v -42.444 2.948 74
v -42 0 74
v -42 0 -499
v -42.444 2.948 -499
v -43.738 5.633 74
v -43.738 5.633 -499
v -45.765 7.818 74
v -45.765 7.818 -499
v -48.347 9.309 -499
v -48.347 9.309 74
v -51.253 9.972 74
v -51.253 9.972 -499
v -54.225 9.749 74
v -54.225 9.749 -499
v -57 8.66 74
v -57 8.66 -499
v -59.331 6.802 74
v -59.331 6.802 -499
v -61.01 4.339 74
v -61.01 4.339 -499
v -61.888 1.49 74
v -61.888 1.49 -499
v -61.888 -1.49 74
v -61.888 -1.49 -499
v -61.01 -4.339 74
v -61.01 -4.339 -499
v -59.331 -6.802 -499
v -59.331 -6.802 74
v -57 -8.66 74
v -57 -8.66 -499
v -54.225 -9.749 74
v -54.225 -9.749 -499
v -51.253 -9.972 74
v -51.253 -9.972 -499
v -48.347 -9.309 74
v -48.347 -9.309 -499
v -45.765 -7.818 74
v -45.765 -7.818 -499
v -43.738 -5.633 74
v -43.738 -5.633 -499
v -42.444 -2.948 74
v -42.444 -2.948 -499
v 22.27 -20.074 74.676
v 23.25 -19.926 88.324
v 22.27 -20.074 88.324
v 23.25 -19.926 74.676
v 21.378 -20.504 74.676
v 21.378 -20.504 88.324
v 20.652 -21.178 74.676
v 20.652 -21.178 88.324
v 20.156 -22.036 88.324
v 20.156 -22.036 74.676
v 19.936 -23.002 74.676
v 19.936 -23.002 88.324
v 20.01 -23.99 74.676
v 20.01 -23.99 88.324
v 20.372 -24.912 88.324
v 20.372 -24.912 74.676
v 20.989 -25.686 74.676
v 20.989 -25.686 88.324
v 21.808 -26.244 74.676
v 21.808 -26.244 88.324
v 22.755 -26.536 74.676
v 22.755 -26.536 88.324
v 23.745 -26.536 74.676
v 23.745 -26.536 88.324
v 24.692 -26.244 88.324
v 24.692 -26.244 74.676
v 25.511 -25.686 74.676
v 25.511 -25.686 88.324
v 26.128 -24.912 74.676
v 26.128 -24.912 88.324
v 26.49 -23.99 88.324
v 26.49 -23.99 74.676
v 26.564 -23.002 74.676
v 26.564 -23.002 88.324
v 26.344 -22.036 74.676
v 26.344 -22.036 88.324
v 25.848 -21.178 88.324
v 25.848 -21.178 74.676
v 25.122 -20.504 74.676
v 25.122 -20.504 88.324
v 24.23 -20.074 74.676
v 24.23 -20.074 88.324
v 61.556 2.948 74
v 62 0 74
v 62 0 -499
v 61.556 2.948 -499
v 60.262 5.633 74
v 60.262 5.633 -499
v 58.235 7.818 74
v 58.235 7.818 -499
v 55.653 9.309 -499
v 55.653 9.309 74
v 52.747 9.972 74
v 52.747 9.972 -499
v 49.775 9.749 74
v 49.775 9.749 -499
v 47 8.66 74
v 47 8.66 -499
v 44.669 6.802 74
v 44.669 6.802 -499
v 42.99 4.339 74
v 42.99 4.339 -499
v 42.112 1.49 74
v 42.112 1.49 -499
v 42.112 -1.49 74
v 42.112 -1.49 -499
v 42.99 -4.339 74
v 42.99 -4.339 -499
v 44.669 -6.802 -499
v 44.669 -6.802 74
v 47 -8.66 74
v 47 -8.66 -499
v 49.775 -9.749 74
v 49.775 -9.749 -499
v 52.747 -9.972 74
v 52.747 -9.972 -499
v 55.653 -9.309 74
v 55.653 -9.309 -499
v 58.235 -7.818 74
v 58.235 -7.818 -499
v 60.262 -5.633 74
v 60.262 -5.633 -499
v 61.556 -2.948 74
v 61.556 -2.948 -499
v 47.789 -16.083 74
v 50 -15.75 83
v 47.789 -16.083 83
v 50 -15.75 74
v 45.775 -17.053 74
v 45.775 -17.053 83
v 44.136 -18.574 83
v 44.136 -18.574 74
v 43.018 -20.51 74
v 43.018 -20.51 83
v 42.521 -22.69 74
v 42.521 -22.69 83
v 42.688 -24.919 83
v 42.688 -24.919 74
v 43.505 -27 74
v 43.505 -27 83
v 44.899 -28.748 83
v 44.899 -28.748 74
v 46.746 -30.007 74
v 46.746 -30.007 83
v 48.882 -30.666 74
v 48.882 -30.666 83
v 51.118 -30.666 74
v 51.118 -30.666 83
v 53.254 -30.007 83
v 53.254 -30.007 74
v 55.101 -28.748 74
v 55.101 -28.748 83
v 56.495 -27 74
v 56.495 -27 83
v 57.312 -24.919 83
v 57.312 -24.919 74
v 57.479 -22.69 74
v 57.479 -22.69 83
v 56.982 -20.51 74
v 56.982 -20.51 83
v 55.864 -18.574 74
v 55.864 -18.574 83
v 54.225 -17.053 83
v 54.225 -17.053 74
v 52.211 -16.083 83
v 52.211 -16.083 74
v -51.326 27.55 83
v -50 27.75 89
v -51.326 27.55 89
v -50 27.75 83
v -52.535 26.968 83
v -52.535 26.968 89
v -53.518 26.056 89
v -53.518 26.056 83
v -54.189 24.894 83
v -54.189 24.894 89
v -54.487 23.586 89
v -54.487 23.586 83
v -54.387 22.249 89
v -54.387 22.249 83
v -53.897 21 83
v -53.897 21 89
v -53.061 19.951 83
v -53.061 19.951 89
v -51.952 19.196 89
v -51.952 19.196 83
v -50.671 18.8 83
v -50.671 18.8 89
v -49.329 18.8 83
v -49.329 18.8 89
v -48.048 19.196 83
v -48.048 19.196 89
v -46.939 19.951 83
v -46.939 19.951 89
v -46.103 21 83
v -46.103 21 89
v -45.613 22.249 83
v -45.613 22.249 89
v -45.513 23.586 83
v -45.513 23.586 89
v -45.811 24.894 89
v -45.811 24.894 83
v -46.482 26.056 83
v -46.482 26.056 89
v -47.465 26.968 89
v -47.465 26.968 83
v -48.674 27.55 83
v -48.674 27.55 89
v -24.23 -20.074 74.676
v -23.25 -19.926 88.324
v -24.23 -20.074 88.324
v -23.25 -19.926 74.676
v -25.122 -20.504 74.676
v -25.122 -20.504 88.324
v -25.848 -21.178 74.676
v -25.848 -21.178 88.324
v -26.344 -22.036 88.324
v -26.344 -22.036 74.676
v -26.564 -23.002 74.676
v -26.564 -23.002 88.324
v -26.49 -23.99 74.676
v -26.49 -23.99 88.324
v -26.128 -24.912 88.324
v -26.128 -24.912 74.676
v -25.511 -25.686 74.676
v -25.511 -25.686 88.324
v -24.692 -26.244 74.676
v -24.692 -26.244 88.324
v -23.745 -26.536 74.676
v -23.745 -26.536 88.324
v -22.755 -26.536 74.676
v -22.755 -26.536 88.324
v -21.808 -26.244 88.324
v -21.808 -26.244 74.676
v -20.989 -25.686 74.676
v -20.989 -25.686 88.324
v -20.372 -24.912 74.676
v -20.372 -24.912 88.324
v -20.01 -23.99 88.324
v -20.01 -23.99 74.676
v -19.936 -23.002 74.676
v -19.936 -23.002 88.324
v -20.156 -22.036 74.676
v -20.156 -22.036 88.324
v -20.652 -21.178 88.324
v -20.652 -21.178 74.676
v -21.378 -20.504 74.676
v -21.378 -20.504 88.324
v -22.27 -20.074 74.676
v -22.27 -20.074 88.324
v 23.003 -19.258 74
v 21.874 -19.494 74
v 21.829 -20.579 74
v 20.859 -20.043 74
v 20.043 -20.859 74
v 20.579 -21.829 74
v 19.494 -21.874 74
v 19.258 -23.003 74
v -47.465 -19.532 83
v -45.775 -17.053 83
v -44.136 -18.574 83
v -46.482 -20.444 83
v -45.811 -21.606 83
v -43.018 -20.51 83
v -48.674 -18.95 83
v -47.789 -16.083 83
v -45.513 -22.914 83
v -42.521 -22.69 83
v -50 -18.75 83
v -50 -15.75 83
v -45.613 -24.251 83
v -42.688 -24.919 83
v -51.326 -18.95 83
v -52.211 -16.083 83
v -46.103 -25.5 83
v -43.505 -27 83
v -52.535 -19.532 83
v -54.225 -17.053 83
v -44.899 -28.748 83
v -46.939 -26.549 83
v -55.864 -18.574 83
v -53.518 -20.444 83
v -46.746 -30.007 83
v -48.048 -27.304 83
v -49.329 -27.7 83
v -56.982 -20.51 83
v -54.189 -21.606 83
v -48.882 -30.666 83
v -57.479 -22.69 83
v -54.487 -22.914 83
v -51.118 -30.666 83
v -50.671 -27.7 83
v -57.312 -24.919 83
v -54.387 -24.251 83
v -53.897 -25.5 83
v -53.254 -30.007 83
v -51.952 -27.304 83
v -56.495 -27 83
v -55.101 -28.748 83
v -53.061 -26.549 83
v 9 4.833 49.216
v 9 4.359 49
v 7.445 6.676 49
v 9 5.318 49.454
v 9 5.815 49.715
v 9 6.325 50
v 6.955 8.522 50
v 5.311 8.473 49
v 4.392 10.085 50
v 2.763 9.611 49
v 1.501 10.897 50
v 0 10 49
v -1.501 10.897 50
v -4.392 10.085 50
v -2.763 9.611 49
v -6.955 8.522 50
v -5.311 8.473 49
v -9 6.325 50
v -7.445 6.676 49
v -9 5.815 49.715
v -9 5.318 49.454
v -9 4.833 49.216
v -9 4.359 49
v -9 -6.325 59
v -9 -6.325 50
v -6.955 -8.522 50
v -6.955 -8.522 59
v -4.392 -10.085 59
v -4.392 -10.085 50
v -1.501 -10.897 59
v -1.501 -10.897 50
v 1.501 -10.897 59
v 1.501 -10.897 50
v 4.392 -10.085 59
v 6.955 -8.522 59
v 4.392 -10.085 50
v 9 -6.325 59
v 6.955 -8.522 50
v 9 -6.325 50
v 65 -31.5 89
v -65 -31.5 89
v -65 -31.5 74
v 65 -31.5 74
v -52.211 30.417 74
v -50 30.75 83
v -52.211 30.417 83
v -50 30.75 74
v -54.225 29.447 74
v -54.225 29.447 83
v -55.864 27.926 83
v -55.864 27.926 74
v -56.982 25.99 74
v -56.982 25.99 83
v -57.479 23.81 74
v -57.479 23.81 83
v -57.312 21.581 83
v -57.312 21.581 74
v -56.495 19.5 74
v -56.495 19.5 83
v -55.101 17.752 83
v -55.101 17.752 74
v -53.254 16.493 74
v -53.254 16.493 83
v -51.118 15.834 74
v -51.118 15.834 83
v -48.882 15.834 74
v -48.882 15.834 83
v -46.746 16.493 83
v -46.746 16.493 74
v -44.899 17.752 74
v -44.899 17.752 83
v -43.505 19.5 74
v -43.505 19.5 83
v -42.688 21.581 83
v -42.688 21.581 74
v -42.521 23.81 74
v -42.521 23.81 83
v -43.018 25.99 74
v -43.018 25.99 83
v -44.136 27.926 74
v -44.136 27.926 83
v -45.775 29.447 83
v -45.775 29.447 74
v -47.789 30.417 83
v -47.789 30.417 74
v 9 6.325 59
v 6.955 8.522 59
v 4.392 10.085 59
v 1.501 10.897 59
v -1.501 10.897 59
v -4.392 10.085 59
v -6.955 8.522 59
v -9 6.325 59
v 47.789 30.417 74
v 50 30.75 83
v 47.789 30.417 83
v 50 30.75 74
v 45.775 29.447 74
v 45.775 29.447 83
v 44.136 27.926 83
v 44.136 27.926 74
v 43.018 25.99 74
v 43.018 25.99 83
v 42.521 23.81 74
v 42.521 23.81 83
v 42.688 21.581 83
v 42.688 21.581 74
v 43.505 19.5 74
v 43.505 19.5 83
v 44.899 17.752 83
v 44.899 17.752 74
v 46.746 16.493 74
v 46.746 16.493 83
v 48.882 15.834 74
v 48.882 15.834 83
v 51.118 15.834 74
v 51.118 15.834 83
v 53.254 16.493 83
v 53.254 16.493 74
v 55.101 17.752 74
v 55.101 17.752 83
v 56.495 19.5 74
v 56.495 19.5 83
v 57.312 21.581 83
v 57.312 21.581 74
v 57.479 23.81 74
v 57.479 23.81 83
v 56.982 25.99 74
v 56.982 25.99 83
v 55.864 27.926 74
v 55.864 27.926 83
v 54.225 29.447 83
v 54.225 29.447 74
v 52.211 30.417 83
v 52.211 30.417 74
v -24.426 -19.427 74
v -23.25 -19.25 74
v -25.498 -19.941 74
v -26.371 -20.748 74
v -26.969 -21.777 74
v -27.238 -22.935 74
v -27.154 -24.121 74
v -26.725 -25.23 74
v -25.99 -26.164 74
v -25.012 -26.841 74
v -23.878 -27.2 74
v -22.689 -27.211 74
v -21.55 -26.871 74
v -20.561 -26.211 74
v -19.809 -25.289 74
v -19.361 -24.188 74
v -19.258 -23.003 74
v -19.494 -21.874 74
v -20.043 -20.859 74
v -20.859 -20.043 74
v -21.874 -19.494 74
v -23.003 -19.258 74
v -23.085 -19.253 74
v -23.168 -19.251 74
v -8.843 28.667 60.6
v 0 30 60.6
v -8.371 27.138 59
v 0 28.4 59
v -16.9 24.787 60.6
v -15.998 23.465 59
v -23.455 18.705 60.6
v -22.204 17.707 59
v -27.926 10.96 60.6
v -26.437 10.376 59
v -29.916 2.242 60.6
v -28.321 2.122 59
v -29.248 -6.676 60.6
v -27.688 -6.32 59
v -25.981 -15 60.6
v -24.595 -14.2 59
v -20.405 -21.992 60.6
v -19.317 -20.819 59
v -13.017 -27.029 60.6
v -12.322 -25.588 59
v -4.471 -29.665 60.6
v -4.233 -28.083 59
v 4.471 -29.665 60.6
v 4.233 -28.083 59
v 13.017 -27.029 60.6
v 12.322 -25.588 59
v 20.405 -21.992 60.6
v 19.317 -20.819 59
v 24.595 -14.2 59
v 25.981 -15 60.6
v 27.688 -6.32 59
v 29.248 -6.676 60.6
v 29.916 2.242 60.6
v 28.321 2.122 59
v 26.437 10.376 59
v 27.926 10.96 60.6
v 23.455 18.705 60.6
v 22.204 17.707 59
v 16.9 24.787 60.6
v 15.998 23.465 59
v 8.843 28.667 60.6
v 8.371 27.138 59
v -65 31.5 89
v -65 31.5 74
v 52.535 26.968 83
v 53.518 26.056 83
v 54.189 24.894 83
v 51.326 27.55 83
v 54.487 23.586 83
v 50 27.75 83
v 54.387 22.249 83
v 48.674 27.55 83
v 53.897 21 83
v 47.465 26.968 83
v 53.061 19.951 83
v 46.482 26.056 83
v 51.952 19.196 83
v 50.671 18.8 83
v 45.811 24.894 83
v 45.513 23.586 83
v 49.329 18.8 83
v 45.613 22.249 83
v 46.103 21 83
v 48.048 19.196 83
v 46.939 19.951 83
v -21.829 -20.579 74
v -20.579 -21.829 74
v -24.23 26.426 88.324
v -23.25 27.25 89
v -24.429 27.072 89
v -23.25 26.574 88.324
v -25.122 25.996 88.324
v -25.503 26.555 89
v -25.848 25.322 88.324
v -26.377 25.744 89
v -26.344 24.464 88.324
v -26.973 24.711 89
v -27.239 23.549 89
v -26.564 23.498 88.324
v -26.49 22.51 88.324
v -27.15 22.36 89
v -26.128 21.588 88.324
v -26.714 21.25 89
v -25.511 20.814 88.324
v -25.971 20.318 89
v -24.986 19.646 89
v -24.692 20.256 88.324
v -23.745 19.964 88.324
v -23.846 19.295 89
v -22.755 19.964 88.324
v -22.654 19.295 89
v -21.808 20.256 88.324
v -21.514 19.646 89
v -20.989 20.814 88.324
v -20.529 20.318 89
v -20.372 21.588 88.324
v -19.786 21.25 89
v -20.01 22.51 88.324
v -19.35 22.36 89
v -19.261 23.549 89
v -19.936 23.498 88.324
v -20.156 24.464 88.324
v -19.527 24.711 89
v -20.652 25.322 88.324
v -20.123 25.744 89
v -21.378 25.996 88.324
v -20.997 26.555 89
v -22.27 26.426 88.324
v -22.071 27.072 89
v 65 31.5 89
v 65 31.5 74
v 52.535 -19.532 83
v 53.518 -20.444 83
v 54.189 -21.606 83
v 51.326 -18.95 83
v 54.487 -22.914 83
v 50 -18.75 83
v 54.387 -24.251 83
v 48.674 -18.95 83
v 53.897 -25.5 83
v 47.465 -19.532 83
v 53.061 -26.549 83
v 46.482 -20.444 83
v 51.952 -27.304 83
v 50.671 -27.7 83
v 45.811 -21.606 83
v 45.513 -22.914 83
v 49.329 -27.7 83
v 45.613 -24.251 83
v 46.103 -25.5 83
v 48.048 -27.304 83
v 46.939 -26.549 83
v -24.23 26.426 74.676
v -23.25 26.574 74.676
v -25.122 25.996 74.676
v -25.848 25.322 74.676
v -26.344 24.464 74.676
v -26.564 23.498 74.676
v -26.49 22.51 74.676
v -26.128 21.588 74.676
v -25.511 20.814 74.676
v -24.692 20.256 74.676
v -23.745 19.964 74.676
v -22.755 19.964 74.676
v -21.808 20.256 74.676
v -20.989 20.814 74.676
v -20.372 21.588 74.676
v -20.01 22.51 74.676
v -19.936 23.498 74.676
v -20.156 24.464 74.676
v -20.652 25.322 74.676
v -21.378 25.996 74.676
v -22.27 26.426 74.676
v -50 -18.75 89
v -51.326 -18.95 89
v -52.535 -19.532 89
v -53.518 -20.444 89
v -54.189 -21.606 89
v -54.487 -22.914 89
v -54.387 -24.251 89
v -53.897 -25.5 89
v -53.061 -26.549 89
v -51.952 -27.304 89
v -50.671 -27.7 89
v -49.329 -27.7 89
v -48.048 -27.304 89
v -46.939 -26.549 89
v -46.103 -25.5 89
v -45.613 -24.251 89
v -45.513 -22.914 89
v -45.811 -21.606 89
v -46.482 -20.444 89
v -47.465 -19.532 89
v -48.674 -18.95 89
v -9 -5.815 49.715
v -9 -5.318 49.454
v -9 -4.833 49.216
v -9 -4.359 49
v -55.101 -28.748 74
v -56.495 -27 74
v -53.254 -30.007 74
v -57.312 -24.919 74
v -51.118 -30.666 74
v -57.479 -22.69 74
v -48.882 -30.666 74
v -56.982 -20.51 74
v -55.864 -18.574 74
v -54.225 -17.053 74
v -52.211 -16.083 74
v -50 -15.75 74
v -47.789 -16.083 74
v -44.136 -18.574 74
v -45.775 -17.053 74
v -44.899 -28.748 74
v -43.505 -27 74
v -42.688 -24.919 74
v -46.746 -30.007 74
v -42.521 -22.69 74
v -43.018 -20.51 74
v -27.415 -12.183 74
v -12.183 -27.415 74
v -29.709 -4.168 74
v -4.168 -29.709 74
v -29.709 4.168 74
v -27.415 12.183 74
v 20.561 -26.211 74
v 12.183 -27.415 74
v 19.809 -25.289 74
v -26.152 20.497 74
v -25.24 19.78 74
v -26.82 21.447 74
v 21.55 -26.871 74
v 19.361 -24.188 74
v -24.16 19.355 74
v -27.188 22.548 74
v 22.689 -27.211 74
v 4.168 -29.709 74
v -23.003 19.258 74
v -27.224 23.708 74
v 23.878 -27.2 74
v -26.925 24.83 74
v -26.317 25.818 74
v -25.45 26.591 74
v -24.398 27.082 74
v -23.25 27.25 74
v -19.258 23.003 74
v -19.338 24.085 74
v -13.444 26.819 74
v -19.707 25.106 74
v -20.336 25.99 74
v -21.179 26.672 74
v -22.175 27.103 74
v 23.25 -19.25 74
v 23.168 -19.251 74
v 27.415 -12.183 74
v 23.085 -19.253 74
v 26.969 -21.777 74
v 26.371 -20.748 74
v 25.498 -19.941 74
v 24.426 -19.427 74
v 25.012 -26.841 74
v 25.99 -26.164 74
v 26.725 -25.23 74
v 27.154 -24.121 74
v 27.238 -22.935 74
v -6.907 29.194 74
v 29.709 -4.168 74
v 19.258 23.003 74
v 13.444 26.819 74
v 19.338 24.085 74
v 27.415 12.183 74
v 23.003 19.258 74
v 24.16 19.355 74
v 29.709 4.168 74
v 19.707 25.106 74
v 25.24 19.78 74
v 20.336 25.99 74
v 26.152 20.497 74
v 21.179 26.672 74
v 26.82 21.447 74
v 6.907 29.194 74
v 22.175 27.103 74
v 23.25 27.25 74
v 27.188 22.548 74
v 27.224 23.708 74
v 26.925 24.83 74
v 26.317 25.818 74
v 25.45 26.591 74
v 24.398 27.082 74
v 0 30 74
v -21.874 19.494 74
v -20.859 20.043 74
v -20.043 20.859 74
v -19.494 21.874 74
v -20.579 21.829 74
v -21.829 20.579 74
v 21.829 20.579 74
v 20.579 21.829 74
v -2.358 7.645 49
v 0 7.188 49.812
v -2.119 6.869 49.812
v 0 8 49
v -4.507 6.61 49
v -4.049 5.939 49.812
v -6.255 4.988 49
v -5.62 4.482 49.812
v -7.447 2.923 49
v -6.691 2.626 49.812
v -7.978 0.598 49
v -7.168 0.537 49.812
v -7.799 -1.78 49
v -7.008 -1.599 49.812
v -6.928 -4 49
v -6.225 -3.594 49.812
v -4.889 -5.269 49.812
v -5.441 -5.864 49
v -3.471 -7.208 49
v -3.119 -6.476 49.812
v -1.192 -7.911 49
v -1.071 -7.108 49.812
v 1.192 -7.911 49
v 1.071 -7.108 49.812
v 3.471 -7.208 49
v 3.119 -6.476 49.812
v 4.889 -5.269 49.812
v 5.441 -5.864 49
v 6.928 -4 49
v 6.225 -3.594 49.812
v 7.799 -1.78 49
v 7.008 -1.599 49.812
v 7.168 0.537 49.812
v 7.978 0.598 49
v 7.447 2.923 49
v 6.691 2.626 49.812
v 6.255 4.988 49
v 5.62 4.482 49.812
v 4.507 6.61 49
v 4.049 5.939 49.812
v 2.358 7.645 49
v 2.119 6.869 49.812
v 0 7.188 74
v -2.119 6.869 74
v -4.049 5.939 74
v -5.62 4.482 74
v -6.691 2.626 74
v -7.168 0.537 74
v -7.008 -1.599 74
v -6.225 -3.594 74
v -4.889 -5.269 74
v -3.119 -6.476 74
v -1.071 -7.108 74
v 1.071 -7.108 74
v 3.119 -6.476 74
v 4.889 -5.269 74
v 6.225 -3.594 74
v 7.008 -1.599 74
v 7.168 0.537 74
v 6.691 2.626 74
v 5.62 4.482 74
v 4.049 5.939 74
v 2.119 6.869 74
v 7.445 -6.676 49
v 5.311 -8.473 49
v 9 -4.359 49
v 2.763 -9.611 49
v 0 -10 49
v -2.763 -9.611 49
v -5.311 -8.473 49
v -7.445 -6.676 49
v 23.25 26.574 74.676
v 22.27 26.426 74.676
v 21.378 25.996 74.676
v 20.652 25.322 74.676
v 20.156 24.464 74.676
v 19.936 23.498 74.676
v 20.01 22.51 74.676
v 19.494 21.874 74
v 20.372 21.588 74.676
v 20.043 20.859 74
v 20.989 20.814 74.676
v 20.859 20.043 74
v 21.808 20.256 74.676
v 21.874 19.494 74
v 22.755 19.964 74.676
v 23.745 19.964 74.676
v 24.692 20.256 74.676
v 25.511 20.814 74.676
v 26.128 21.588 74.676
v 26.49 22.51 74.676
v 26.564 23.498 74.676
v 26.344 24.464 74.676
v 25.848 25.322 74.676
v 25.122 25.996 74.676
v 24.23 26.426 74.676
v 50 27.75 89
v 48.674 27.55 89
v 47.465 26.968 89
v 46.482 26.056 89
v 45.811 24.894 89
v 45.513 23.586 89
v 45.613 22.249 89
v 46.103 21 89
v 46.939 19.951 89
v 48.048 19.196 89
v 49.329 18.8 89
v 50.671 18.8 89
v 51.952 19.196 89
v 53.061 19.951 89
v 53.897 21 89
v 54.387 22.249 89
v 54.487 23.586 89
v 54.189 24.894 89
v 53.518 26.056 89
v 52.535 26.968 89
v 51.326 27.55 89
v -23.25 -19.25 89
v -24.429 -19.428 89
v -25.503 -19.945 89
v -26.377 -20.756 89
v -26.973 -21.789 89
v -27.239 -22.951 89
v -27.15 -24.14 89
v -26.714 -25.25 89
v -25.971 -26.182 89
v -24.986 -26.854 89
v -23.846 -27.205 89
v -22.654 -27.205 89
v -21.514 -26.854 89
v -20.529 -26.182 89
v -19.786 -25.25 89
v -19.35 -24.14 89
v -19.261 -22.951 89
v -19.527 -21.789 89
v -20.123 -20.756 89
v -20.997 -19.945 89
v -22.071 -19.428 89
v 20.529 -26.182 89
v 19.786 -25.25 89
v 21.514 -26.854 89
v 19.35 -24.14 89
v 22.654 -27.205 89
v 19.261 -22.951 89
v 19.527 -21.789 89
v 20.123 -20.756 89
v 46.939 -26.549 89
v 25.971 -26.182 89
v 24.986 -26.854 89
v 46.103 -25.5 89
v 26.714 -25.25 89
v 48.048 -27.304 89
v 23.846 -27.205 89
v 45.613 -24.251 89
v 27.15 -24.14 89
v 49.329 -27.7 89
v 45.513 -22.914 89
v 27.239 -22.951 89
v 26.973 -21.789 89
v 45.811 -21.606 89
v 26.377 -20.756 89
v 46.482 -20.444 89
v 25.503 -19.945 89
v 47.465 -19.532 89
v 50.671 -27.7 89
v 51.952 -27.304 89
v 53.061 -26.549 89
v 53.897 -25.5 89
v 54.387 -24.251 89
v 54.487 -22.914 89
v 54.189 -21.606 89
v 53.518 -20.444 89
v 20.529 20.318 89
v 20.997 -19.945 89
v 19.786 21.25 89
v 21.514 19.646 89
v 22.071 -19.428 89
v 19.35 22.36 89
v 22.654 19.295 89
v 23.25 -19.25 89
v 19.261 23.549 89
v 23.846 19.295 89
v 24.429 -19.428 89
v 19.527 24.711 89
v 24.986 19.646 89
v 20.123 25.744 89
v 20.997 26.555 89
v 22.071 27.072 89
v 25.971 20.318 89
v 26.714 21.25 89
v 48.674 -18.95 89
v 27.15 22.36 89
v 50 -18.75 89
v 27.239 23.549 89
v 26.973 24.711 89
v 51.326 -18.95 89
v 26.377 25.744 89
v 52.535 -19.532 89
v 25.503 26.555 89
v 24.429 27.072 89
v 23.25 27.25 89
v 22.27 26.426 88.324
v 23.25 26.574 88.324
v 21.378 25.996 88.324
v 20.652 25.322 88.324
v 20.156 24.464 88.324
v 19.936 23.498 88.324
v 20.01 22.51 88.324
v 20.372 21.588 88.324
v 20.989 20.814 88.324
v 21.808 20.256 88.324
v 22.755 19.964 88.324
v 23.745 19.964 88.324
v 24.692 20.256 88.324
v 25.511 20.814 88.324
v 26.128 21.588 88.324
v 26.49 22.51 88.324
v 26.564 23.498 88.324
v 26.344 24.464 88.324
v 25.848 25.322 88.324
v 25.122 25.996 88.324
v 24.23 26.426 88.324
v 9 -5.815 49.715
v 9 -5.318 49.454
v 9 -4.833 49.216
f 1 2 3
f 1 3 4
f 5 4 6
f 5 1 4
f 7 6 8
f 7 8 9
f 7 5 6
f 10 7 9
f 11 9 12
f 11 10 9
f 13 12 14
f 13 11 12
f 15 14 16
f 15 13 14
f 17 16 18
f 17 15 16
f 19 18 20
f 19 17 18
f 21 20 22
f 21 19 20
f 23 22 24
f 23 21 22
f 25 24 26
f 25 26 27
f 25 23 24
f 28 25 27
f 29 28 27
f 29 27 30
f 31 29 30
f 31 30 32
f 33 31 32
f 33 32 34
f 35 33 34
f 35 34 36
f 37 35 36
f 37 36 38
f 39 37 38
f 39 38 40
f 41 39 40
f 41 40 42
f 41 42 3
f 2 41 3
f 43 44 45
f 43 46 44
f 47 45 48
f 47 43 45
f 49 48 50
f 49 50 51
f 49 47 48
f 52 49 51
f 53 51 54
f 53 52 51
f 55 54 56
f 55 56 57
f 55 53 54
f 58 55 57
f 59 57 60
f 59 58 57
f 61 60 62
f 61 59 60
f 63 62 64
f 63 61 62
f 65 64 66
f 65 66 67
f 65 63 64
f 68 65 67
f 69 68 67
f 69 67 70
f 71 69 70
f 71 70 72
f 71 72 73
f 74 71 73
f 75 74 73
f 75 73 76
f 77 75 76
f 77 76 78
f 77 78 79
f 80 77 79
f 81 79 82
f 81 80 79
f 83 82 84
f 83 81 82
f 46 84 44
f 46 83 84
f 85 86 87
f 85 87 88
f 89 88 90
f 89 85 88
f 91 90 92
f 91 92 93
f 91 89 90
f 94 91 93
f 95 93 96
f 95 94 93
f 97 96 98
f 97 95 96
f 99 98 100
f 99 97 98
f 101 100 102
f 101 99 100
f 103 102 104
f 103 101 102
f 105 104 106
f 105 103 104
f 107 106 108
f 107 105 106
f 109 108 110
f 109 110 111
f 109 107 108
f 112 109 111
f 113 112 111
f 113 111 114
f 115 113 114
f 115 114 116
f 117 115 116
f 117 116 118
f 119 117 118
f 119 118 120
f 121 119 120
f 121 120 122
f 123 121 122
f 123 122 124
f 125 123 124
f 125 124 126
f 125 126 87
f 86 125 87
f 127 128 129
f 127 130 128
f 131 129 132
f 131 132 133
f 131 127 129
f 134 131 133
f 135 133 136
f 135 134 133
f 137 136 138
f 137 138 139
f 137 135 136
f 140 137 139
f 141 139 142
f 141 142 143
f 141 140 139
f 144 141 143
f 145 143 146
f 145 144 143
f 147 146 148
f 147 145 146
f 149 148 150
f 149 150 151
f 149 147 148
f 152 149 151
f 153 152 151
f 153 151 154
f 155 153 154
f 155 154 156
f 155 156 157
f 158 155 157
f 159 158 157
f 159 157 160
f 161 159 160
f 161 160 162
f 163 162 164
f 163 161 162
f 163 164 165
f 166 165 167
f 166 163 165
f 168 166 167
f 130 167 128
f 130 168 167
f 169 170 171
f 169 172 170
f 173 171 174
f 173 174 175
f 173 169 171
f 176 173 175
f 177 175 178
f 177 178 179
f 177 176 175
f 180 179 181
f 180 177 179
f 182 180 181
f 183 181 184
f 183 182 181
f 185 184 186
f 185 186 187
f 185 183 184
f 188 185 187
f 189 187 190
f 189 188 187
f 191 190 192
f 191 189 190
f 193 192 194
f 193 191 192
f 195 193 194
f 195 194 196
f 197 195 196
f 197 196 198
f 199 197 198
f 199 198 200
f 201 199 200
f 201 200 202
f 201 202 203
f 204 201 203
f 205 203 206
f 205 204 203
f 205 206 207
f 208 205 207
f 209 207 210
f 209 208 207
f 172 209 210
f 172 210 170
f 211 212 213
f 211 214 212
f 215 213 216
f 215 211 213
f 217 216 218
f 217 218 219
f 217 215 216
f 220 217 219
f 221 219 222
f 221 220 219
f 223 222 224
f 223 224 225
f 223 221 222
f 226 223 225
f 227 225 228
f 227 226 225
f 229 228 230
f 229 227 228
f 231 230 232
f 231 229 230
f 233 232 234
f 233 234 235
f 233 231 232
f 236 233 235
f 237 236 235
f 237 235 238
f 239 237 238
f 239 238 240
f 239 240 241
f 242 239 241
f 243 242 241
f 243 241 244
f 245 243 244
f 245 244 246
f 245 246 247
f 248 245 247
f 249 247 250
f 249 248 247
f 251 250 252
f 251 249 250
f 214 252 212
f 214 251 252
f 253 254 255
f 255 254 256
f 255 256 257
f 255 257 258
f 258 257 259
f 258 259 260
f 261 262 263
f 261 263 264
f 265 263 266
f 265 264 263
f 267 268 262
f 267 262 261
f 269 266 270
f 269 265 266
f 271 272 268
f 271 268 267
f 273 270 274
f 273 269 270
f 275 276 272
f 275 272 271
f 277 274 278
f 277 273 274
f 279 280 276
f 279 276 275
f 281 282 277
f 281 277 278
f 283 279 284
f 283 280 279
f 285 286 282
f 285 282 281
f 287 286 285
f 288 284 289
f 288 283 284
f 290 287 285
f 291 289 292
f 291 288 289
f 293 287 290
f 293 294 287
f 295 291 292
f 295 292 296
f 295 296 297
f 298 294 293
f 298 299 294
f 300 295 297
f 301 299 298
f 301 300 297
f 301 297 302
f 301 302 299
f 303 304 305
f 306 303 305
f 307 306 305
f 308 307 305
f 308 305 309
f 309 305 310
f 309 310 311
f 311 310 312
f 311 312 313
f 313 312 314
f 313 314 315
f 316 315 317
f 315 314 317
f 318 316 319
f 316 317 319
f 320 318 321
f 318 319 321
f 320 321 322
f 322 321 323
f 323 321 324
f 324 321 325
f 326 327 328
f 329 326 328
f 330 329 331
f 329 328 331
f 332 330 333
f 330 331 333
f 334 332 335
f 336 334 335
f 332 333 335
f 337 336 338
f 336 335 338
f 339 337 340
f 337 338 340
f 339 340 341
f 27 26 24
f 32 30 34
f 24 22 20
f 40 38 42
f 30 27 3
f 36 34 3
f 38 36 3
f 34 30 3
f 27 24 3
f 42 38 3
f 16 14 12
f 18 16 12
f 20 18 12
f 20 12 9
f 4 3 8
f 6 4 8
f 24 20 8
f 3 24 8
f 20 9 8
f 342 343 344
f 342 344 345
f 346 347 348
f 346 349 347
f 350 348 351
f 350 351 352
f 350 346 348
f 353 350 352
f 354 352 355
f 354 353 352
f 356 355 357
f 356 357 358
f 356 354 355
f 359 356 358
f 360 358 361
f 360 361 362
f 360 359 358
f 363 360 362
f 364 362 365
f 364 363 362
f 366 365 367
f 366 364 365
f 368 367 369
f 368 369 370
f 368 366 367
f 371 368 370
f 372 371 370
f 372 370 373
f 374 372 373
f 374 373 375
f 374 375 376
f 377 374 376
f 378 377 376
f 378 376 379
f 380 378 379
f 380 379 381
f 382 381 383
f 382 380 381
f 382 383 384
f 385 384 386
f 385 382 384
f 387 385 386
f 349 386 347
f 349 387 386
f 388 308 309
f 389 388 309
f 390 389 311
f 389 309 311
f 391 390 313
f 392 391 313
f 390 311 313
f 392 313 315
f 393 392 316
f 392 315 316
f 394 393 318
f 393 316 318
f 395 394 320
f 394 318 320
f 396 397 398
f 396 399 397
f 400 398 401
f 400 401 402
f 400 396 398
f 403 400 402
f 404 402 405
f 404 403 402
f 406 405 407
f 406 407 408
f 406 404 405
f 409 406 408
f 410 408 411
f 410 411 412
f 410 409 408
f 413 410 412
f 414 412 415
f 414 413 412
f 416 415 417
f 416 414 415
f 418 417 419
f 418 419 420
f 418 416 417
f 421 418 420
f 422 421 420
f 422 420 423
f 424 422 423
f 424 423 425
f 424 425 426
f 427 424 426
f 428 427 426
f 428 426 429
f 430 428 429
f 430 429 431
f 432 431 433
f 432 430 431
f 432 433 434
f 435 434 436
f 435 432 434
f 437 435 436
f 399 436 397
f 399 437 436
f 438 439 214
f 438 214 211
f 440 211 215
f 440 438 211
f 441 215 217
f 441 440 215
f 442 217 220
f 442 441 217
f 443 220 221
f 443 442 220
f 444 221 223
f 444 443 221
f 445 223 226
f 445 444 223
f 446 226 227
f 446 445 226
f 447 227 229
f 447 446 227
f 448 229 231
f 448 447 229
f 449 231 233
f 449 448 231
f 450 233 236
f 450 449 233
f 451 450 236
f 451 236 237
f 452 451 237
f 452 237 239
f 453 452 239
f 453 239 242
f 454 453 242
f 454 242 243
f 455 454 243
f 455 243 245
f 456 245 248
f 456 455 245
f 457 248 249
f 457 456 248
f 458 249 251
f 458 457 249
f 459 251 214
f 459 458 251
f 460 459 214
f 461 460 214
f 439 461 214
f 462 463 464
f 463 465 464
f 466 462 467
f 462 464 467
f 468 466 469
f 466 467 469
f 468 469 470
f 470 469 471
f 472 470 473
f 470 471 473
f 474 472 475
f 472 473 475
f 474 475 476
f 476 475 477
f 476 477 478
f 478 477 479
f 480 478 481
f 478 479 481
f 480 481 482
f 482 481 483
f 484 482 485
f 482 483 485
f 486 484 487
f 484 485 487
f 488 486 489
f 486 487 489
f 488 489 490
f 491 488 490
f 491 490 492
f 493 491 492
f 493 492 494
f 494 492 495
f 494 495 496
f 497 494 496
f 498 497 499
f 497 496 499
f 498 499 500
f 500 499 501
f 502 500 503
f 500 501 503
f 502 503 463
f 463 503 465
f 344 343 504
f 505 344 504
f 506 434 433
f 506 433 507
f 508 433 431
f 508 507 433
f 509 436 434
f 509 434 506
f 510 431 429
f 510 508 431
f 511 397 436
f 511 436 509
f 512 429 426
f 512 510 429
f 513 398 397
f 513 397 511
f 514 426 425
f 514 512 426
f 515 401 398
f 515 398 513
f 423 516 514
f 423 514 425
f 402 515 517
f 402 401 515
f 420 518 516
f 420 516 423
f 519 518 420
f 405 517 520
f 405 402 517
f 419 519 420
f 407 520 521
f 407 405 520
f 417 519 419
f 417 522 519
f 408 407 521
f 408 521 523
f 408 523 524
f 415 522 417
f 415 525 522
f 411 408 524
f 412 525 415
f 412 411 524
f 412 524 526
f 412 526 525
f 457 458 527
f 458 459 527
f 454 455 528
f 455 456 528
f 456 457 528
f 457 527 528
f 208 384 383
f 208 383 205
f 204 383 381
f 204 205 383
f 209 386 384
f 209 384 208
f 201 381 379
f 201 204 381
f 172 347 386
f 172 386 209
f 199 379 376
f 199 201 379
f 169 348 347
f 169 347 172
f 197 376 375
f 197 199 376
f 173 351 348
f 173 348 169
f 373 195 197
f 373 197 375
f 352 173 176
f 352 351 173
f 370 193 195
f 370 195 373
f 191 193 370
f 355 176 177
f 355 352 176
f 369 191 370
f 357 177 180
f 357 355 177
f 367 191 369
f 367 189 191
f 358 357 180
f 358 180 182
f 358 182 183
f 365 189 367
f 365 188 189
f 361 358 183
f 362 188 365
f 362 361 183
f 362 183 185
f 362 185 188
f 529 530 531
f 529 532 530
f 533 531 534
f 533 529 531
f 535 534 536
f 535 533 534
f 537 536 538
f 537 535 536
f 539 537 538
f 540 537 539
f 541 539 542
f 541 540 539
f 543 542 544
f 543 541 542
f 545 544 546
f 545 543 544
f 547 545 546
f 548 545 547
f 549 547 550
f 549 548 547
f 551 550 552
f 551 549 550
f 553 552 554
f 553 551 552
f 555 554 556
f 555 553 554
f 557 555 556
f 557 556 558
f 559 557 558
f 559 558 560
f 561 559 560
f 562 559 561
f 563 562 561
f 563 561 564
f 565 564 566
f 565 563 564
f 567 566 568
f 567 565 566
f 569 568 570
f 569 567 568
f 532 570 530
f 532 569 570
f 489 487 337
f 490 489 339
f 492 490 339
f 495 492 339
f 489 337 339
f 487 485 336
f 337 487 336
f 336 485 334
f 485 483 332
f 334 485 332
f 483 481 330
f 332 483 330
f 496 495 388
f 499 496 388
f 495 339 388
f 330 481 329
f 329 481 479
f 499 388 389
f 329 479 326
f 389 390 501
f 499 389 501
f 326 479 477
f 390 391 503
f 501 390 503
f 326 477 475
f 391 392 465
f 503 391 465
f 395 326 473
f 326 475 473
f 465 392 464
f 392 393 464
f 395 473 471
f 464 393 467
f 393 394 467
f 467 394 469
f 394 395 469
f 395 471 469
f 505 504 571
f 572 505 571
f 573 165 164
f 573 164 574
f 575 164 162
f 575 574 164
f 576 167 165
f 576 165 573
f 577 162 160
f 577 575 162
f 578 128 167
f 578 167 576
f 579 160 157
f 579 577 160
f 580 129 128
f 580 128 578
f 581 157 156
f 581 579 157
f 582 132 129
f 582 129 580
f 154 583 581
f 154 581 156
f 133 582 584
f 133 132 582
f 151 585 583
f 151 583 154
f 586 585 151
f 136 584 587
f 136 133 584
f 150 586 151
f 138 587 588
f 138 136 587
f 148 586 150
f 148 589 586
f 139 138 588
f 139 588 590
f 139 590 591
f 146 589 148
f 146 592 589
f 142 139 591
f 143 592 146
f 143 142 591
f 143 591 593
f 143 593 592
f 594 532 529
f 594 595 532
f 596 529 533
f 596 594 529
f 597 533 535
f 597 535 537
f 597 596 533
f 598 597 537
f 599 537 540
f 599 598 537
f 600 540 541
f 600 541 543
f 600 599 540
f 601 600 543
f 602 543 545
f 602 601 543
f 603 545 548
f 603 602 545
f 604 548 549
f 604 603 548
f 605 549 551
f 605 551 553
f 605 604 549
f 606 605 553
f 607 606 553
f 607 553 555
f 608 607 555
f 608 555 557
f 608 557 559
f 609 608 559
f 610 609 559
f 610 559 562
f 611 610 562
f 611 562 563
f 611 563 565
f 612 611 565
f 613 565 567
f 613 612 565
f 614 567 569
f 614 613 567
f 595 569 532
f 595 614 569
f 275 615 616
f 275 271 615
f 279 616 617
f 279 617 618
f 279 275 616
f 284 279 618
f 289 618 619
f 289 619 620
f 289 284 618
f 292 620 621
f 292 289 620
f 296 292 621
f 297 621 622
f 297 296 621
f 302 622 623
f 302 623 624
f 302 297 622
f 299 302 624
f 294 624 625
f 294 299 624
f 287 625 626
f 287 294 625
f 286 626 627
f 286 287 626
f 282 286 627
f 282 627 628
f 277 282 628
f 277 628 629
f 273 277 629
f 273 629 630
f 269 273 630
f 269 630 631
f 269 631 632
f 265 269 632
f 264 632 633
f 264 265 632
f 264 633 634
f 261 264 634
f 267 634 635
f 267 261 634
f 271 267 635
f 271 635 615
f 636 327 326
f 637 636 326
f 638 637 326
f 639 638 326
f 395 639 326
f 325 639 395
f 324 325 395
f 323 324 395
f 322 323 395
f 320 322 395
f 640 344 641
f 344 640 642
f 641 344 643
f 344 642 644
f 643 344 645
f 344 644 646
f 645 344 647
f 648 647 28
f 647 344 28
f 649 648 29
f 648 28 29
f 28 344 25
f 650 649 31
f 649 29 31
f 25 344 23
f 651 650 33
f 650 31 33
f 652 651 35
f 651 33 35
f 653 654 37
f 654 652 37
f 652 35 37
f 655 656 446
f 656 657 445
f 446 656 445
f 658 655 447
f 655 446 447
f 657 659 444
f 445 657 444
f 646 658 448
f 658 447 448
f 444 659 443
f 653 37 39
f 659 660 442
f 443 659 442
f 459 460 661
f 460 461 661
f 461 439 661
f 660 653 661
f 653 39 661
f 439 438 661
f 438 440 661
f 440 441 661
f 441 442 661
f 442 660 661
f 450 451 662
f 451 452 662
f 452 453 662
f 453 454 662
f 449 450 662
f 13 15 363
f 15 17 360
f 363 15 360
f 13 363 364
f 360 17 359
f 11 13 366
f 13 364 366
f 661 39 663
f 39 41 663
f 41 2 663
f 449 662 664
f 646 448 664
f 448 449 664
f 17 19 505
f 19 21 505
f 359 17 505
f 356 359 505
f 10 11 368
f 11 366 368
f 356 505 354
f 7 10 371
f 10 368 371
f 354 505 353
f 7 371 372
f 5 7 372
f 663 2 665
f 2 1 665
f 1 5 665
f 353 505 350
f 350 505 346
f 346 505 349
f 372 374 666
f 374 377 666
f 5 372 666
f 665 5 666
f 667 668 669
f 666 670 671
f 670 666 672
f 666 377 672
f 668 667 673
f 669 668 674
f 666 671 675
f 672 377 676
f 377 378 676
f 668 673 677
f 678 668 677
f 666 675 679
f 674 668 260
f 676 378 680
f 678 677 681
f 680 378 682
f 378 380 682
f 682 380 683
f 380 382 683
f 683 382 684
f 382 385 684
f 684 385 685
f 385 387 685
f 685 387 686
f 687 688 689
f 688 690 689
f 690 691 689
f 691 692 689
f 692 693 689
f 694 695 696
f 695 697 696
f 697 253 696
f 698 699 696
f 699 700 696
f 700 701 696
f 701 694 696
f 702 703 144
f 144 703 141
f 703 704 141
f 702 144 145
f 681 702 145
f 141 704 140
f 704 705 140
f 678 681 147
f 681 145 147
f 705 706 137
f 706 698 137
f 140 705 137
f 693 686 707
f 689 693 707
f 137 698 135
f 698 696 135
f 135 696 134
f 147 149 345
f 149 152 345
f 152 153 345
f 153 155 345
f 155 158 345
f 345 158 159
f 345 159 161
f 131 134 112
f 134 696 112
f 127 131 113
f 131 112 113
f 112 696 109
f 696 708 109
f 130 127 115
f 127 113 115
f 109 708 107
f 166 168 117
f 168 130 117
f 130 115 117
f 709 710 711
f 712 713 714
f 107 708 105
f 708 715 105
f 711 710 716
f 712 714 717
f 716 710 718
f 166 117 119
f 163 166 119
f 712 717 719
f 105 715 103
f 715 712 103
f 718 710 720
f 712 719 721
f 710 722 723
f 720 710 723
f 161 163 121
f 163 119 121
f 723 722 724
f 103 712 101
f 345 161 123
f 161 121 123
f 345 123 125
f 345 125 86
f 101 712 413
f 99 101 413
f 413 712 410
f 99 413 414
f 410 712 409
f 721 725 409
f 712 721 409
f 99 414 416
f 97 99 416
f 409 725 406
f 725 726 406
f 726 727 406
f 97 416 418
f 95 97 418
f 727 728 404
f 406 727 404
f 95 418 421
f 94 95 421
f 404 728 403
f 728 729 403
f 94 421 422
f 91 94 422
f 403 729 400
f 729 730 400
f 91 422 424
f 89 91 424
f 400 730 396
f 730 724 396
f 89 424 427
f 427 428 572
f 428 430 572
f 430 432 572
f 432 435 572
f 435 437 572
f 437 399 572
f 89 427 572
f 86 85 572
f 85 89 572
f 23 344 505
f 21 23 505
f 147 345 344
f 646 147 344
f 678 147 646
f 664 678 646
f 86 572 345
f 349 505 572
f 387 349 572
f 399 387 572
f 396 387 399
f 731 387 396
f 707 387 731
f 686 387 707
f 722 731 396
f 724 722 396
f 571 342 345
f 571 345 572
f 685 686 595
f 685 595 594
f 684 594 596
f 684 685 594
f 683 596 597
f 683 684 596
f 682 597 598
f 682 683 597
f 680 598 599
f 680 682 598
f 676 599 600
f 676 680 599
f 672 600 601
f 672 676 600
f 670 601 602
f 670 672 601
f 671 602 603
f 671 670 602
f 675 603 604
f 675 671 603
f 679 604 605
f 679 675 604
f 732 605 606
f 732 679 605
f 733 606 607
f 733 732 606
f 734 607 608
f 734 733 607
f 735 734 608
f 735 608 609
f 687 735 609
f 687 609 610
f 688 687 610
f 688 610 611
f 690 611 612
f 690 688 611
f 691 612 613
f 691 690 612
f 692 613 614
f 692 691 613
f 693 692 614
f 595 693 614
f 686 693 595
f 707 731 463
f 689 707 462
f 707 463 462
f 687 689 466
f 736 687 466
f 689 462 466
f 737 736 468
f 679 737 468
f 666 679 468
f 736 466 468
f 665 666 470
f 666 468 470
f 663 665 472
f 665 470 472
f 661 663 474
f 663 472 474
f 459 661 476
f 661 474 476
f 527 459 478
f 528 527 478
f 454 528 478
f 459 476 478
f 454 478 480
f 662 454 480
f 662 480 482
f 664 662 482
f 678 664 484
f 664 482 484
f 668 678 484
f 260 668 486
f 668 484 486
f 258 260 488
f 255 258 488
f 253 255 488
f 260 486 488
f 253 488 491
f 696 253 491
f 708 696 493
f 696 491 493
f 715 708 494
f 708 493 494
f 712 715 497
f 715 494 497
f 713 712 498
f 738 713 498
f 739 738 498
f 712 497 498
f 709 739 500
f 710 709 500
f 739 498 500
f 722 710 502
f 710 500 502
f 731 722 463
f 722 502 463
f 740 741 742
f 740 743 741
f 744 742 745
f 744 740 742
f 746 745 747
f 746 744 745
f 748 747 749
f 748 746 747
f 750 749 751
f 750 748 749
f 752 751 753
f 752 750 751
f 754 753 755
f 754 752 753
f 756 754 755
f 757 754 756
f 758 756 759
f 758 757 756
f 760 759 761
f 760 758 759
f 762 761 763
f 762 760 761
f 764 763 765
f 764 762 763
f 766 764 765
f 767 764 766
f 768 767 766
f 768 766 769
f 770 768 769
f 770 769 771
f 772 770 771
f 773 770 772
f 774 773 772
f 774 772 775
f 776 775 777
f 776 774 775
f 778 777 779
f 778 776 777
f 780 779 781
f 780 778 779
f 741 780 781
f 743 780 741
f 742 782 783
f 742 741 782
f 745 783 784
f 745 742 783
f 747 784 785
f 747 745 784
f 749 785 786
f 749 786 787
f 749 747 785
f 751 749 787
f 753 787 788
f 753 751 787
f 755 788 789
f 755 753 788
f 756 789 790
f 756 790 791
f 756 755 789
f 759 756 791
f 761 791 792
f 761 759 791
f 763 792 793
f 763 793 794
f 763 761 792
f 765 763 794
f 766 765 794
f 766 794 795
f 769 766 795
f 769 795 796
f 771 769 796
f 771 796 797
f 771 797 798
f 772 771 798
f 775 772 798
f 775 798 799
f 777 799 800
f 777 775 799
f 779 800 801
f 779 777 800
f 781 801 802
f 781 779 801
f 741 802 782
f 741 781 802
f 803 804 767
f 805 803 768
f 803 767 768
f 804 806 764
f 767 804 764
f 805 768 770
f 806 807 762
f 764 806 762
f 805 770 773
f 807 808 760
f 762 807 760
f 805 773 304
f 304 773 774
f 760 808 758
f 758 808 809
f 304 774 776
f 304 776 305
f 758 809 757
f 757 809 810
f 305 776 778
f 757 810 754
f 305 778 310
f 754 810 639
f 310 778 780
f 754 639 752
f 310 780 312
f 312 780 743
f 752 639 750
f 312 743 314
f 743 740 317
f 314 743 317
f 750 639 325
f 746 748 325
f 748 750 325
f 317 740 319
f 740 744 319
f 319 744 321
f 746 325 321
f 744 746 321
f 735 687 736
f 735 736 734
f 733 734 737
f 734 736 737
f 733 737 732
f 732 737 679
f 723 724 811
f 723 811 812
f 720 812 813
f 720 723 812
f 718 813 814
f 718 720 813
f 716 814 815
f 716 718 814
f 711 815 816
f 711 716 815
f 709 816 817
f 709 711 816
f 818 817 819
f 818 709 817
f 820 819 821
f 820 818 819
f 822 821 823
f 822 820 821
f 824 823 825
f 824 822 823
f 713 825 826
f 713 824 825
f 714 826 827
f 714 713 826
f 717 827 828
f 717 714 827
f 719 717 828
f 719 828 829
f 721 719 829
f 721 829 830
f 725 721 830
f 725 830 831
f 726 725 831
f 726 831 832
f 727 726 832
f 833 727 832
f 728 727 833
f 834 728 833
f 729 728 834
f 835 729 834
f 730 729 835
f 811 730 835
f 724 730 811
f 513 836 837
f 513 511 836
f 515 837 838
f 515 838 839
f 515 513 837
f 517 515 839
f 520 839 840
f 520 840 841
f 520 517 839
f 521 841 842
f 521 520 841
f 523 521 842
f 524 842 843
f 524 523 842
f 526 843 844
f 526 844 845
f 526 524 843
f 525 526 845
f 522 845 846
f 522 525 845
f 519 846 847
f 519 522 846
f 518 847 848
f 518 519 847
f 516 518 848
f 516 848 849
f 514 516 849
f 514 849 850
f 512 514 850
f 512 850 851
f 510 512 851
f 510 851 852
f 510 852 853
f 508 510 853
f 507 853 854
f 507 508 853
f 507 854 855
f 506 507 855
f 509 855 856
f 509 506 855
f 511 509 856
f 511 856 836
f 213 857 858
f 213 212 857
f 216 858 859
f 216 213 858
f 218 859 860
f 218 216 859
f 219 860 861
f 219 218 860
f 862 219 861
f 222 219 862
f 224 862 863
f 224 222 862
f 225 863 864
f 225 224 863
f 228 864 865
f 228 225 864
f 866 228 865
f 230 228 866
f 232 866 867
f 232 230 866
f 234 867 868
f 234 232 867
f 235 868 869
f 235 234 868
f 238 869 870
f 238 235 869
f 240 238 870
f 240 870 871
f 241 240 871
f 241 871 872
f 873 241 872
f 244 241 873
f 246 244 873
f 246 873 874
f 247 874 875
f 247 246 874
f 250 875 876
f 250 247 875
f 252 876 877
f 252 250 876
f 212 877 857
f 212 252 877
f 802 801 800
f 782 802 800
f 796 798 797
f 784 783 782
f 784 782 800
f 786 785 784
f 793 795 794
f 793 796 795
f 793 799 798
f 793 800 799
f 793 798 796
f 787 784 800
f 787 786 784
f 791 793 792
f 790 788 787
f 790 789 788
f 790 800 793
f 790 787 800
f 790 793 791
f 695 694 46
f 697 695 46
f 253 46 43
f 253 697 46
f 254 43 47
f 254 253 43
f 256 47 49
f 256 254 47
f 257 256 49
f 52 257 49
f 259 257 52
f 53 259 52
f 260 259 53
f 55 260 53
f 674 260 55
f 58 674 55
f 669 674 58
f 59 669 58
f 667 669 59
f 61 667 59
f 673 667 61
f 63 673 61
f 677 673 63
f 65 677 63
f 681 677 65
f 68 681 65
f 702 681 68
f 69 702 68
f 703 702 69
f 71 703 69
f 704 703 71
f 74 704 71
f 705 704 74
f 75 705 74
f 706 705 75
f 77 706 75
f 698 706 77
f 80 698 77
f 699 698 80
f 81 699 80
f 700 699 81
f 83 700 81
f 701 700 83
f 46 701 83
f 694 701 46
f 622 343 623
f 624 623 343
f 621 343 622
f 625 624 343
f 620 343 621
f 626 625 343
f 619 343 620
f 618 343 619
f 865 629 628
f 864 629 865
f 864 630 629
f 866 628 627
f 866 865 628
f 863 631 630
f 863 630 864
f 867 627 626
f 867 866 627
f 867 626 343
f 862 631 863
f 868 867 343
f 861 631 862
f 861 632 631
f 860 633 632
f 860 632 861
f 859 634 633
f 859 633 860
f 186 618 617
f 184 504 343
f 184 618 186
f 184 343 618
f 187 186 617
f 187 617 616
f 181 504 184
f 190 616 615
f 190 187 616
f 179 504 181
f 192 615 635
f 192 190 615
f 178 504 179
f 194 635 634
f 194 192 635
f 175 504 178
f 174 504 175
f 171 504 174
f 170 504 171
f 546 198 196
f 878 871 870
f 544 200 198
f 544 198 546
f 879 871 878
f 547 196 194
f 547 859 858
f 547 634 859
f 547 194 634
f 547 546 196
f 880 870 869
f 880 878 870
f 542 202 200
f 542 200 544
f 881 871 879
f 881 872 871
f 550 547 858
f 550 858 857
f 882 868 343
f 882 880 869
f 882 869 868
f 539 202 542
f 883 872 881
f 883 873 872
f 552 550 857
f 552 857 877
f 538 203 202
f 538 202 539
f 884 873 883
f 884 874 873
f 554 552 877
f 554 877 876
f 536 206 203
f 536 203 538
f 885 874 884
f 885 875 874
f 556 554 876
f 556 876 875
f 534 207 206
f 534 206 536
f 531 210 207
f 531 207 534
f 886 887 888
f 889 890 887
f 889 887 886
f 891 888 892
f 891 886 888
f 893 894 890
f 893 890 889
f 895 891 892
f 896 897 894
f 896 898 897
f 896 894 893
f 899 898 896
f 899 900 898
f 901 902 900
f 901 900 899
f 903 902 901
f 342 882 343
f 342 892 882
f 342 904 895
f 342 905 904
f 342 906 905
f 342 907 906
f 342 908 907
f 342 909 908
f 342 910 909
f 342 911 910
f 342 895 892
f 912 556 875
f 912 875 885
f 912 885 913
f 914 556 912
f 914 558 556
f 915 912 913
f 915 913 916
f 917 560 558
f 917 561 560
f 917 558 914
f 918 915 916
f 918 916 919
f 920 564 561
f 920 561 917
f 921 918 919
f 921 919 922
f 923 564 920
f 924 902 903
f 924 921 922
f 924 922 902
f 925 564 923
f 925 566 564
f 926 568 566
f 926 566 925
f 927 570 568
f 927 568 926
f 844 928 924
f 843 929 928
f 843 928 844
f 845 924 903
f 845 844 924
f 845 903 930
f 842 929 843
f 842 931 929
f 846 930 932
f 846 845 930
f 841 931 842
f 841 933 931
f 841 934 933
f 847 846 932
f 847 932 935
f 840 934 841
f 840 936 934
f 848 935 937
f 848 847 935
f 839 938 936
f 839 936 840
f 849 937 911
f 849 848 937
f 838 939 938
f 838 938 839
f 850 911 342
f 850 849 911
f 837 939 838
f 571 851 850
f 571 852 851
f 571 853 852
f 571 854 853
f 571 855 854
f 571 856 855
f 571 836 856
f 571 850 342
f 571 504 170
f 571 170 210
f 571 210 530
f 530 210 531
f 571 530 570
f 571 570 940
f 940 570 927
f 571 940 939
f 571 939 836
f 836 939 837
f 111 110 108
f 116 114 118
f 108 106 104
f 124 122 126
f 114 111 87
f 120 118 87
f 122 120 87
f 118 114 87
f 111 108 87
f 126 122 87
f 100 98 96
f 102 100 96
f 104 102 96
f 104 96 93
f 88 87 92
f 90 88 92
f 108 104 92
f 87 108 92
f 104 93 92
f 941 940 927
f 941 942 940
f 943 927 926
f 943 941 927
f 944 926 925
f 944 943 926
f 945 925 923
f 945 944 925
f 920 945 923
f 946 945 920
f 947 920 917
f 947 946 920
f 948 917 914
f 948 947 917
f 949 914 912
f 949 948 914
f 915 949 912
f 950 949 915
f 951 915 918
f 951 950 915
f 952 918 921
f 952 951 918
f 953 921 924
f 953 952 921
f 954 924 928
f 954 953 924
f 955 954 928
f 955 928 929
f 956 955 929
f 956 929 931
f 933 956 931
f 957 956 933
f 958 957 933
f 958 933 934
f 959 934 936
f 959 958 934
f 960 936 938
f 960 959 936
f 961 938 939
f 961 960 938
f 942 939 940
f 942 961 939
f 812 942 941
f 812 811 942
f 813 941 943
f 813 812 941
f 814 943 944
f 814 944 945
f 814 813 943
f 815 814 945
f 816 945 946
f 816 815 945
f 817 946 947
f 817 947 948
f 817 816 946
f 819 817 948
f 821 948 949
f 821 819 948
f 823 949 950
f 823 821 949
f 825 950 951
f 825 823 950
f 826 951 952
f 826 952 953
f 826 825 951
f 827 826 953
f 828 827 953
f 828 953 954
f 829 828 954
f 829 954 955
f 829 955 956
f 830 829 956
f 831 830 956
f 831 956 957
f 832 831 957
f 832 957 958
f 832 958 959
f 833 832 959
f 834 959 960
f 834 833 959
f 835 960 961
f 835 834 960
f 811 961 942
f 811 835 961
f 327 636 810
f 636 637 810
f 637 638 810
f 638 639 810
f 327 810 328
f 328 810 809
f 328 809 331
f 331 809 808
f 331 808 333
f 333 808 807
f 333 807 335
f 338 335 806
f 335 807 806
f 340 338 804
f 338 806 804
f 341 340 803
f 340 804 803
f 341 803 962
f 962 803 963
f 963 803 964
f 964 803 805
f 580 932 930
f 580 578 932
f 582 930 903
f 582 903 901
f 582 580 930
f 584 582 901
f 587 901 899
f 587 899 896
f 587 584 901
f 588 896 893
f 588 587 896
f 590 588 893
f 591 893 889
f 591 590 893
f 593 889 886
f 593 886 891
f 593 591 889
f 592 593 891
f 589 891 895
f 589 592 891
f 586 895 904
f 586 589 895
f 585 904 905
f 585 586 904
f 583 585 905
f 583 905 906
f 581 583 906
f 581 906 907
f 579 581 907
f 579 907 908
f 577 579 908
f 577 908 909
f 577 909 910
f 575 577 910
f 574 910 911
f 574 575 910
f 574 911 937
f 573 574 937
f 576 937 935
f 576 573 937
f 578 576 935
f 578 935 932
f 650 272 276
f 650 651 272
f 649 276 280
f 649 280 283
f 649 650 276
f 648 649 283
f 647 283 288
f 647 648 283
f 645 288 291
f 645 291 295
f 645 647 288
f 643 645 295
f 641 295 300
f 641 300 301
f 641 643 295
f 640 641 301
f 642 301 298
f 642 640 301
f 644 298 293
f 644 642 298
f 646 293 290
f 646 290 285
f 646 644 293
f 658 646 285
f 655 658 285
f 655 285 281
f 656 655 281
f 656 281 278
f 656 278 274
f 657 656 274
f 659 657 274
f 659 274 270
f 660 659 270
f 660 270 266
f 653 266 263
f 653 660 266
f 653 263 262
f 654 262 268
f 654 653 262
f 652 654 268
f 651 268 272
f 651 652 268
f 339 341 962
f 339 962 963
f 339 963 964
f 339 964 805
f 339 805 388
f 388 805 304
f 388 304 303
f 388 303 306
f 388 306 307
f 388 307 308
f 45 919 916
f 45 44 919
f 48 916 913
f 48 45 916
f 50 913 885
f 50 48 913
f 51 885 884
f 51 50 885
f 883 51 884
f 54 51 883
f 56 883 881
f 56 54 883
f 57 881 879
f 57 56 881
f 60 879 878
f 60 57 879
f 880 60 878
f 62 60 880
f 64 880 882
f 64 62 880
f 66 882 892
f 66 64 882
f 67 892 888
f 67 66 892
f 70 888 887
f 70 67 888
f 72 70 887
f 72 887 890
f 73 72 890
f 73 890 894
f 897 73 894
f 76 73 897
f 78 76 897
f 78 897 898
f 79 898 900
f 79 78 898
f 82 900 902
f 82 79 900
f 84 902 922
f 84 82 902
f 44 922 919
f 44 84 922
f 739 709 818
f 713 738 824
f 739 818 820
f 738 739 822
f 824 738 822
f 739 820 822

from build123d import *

# Parameters (mm, degrees)
SKETCH1_W            = 130
SKETCH1_H            = 63
BOSS_EXTRUDE1_DEPTH  = 15
LPATTERN1_COUNT      = 2
LPATTERN1_PITCH      = 46.5
LPATTERN1_COUNT_DIR2 = 2
LPATTERN1_PITCH_DIR2 = 46.5
LPATTERN2_COUNT      = 2
LPATTERN2_PITCH      = 100
LPATTERN2_COUNT_DIR2 = 2
LPATTERN2_PITCH_DIR2 = 46.5
SKETCH6_R            = 10
BOSS_EXTRUDE2_DEPTH  = 588
SKETCH7_R            = 10
BOSS_EXTRUDE3_DEPTH  = 588
SKETCH10_W           = 40
SKETCH10_H           = 40
SKETCH10_W_2         = 18
SKETCH10_H_2         = 30
CUT_EXTRUDE1_DEPTH   = 10


with BuildPart() as part:
    # Sketch1 → Boss-Extrude1 (new body)
    with BuildSketch(Plane.XY.offset(89)):
        Rectangle(SKETCH1_W, SKETCH1_H)
    extrude(amount=-BOSS_EXTRUDE1_DEPTH)

    # Sketch2 → Cut-Revolve1 (revolve, cut)
    with BuildSketch(Plane(origin=(23.25, 0, 0), x_dir=(0, 0, -1), z_dir=(1, 0, 0))):
        Polygon((-89, 23.25), (-89, 27.25), (-88.3235, 26.5735), (-74.6765, 26.5735), (-74, 27.25), (-74, 23.25), align=None)
    cut_revolve1 = revolve(axis=Axis((23.25, 23.25, 74), (0, 0, 1)), mode=Mode.SUBTRACT)

    # LPattern1: Cut-Revolve1 2 × 2
    with Locations(*[(-i * LPATTERN1_PITCH, -j * LPATTERN1_PITCH_DIR2, 0) for i in range(LPATTERN1_COUNT) for j in range(LPATTERN1_COUNT_DIR2) if (i, j) != (0, 0)]):
        add(cut_revolve1, mode=Mode.SUBTRACT)

    # Sketch4 → Cut-Revolve2 (revolve, cut)
    with BuildSketch(Plane(origin=(50, 0, 0), x_dir=(0, 0, -1), z_dir=(1, 0, 0))):
        Polygon((-89, 23.25), (-89, 27.75), (-83, 27.75), (-83, 30.75), (-74, 30.75), (-74, 23.25), align=None)
    cut_revolve2 = revolve(axis=Axis((50, 23.25, 74), (0, 0, 1)), mode=Mode.SUBTRACT)

    # LPattern2: Cut-Revolve2 2 × 2
    with Locations(*[(-i * LPATTERN2_PITCH, -j * LPATTERN2_PITCH_DIR2, 0) for i in range(LPATTERN2_COUNT) for j in range(LPATTERN2_COUNT_DIR2) if (i, j) != (0, 0)]):
        add(cut_revolve2, mode=Mode.SUBTRACT)

    # Sketch6 → Boss-Extrude2 (add)
    with BuildSketch(Plane.XY.offset(89)):
        with Locations((-52, 0)):
            Circle(SKETCH6_R)
    extrude(amount=-BOSS_EXTRUDE2_DEPTH)

    # Sketch7 → Boss-Extrude3 (add)
    with BuildSketch(Plane.XY.offset(89)):
        with Locations((52, 0)):
            Circle(SKETCH7_R)
    extrude(amount=-BOSS_EXTRUDE3_DEPTH)

    # Sketch8 → Revolve1 (revolve)
    with BuildSketch(Plane(origin=(0, 0, 0), x_dir=(0, 0, -1), z_dir=(1, 0, 0))):
        Polygon((-74, 0), (-74, 30), (-60.6, 30), (-59, 28.4), (-59, 11), (-50, 11), (-49, 10), (-49, 0), align=None)
    revolve(axis=Axis((0, 0, 49), (0, 0, 1)))

    # Sketch9 → Cut-Revolve3 (revolve, cut)
    with BuildSketch(Plane(origin=(0, 0, 0), x_dir=(0, 0, -1), z_dir=(1, 0, 0))):
        Polygon((-74, 0), (-74, 7.188), (-49.812, 7.188), (-49, 8), (-49, 0), align=None)
    revolve(axis=Axis((0, 0, 49), (0, 0, 1)), mode=Mode.SUBTRACT)

    # Sketch10 → Cut-Extrude1 (cut)
    with BuildSketch(Plane.XY.offset(49)):
        Rectangle(SKETCH10_W, SKETCH10_H)
        Rectangle(SKETCH10_W_2, SKETCH10_H_2, mode=Mode.SUBTRACT)
    extrude(amount=CUT_EXTRUDE1_DEPTH, mode=Mode.SUBTRACT)


solid = part.part
